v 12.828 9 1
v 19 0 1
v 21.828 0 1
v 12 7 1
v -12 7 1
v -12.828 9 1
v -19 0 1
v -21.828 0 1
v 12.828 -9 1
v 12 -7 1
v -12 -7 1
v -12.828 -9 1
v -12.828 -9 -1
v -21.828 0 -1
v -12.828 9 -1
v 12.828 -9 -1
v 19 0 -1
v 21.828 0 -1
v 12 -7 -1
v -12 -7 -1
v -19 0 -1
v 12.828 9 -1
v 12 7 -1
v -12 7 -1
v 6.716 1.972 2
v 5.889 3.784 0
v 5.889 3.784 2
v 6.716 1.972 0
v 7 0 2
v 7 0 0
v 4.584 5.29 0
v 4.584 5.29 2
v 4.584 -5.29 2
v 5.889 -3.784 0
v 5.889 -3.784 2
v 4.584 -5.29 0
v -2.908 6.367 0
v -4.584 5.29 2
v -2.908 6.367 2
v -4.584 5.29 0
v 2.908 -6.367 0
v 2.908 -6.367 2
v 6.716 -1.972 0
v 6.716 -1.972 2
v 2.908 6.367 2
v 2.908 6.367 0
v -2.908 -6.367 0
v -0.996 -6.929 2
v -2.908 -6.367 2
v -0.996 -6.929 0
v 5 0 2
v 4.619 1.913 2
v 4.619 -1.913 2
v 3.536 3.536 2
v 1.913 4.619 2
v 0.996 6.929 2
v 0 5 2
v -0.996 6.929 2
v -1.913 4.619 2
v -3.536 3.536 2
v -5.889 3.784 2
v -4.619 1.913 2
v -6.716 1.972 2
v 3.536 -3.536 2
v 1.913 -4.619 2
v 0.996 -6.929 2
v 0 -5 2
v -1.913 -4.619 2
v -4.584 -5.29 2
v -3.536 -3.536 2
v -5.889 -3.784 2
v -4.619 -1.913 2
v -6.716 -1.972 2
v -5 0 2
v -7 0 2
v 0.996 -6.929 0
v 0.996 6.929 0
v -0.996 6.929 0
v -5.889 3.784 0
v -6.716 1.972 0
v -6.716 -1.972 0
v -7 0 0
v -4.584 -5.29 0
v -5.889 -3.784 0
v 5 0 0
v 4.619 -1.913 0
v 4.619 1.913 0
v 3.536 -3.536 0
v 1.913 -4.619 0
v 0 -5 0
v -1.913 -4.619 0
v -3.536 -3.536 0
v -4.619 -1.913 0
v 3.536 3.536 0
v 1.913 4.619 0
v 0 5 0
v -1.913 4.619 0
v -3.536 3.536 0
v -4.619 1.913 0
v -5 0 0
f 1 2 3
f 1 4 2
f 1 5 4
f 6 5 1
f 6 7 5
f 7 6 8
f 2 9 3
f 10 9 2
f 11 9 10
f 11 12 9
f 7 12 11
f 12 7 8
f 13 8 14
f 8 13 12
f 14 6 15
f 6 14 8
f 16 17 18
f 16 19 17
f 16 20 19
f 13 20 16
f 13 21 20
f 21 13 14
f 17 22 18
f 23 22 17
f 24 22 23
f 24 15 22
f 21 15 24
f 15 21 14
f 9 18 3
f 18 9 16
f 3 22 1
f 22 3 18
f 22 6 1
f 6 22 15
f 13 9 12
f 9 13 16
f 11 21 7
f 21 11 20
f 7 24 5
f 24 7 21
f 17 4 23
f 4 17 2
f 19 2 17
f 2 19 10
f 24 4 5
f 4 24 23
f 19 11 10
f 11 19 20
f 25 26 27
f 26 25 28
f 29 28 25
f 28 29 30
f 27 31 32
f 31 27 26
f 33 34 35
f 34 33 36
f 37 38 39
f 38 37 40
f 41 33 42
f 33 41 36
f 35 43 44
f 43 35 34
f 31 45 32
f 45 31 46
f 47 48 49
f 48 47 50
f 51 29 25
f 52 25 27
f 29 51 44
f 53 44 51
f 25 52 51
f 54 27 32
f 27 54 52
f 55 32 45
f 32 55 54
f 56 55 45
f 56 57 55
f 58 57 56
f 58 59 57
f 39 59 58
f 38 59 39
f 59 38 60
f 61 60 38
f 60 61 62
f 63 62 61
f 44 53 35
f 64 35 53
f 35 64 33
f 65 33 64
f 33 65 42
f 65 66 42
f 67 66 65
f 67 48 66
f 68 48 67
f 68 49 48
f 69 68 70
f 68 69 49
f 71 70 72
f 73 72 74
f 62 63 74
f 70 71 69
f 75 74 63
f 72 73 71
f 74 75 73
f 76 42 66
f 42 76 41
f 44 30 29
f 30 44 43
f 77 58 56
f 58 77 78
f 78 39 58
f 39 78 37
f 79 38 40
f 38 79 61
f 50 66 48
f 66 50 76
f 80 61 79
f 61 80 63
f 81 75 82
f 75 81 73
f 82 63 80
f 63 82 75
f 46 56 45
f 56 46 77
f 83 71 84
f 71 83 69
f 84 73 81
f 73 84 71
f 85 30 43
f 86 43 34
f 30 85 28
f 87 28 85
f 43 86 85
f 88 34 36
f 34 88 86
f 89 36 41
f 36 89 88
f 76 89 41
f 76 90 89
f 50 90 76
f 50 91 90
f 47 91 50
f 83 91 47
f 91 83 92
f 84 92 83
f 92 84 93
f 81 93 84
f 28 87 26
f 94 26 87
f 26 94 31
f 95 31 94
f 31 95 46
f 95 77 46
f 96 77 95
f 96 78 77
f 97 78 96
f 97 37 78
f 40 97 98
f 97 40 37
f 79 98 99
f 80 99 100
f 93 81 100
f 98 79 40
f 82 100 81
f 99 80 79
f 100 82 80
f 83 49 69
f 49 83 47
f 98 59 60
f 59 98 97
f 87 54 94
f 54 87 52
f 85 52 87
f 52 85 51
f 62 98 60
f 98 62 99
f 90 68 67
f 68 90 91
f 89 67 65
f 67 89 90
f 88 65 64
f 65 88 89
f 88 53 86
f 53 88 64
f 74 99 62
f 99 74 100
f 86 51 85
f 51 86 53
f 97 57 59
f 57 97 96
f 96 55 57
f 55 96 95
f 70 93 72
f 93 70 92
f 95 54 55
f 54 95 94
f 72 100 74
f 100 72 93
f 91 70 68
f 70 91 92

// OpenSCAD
// file: components/cylinder_hole.scad
module cylinder_hole( outer_r = 2, inner_r = 1, h = 1) {
  difference() {
    cylinder(r1 = outer_r, r2 = outer_r, h = h);
    cylinder(r1 = inner_r, r2 = inner_r, h = h);
  }
}
// file: components/plug_hole.scad
module figure(dims) {
  union() {
    square_diagonal = dims.y;
    square_side = square_diagonal / sqrt(2);
    square_z = dims.z;

    translate([-(dims.x - square_diagonal) / 2, 0, 0])
    rotate(a = 45, v = [0, 0, 1]) 
    cube([square_side, square_side, dims.z], center = true);

    translate([(dims.x - square_diagonal) / 2, 0,0])
    rotate(a = 45, v = [0, 0, 1]) 
    cube([square_side, square_side, dims.z], center = true);
    
    // Base
    cube([dims.x - dims.y, dims.y, dims.z], center = true);
  }
}

plug_hole_inner_width = 38;
plug_hole_inner_height = 14;

function fn_hole_outer_width(border_thickness) = plug_hole_inner_width + border_thickness * 2 * sqrt(2);

module plug_hole(border_thickness = 2, h = 2, thin = true) {
  border_x = border_thickness * sqrt(2);
  border_y = border_thickness;  

  difference() {
    if (thin) {
      figure([plug_hole_inner_width + 2 * border_x, plug_hole_inner_height + 2 * border_y, h]);
    } else {
      cube([plug_hole_inner_width + 2 * border_x, plug_hole_inner_height + 2 * border_y, h], center = true);
    }

    figure([plug_hole_inner_width, plug_hole_inner_height, h]);
  }
}
// main file
include <./components/plug_hole.scad>
include <./components/cylinder_hole.scad>


hole_outer_radius = 7;
hole_diameter = hole_outer_radius * 2;


union() {
  // translate([0, hole_outer_radius, 0])
  plug_hole(center = true);

  cylinder_hole(inner_r = 5, outer_r = hole_outer_radius, h = 2);
}
